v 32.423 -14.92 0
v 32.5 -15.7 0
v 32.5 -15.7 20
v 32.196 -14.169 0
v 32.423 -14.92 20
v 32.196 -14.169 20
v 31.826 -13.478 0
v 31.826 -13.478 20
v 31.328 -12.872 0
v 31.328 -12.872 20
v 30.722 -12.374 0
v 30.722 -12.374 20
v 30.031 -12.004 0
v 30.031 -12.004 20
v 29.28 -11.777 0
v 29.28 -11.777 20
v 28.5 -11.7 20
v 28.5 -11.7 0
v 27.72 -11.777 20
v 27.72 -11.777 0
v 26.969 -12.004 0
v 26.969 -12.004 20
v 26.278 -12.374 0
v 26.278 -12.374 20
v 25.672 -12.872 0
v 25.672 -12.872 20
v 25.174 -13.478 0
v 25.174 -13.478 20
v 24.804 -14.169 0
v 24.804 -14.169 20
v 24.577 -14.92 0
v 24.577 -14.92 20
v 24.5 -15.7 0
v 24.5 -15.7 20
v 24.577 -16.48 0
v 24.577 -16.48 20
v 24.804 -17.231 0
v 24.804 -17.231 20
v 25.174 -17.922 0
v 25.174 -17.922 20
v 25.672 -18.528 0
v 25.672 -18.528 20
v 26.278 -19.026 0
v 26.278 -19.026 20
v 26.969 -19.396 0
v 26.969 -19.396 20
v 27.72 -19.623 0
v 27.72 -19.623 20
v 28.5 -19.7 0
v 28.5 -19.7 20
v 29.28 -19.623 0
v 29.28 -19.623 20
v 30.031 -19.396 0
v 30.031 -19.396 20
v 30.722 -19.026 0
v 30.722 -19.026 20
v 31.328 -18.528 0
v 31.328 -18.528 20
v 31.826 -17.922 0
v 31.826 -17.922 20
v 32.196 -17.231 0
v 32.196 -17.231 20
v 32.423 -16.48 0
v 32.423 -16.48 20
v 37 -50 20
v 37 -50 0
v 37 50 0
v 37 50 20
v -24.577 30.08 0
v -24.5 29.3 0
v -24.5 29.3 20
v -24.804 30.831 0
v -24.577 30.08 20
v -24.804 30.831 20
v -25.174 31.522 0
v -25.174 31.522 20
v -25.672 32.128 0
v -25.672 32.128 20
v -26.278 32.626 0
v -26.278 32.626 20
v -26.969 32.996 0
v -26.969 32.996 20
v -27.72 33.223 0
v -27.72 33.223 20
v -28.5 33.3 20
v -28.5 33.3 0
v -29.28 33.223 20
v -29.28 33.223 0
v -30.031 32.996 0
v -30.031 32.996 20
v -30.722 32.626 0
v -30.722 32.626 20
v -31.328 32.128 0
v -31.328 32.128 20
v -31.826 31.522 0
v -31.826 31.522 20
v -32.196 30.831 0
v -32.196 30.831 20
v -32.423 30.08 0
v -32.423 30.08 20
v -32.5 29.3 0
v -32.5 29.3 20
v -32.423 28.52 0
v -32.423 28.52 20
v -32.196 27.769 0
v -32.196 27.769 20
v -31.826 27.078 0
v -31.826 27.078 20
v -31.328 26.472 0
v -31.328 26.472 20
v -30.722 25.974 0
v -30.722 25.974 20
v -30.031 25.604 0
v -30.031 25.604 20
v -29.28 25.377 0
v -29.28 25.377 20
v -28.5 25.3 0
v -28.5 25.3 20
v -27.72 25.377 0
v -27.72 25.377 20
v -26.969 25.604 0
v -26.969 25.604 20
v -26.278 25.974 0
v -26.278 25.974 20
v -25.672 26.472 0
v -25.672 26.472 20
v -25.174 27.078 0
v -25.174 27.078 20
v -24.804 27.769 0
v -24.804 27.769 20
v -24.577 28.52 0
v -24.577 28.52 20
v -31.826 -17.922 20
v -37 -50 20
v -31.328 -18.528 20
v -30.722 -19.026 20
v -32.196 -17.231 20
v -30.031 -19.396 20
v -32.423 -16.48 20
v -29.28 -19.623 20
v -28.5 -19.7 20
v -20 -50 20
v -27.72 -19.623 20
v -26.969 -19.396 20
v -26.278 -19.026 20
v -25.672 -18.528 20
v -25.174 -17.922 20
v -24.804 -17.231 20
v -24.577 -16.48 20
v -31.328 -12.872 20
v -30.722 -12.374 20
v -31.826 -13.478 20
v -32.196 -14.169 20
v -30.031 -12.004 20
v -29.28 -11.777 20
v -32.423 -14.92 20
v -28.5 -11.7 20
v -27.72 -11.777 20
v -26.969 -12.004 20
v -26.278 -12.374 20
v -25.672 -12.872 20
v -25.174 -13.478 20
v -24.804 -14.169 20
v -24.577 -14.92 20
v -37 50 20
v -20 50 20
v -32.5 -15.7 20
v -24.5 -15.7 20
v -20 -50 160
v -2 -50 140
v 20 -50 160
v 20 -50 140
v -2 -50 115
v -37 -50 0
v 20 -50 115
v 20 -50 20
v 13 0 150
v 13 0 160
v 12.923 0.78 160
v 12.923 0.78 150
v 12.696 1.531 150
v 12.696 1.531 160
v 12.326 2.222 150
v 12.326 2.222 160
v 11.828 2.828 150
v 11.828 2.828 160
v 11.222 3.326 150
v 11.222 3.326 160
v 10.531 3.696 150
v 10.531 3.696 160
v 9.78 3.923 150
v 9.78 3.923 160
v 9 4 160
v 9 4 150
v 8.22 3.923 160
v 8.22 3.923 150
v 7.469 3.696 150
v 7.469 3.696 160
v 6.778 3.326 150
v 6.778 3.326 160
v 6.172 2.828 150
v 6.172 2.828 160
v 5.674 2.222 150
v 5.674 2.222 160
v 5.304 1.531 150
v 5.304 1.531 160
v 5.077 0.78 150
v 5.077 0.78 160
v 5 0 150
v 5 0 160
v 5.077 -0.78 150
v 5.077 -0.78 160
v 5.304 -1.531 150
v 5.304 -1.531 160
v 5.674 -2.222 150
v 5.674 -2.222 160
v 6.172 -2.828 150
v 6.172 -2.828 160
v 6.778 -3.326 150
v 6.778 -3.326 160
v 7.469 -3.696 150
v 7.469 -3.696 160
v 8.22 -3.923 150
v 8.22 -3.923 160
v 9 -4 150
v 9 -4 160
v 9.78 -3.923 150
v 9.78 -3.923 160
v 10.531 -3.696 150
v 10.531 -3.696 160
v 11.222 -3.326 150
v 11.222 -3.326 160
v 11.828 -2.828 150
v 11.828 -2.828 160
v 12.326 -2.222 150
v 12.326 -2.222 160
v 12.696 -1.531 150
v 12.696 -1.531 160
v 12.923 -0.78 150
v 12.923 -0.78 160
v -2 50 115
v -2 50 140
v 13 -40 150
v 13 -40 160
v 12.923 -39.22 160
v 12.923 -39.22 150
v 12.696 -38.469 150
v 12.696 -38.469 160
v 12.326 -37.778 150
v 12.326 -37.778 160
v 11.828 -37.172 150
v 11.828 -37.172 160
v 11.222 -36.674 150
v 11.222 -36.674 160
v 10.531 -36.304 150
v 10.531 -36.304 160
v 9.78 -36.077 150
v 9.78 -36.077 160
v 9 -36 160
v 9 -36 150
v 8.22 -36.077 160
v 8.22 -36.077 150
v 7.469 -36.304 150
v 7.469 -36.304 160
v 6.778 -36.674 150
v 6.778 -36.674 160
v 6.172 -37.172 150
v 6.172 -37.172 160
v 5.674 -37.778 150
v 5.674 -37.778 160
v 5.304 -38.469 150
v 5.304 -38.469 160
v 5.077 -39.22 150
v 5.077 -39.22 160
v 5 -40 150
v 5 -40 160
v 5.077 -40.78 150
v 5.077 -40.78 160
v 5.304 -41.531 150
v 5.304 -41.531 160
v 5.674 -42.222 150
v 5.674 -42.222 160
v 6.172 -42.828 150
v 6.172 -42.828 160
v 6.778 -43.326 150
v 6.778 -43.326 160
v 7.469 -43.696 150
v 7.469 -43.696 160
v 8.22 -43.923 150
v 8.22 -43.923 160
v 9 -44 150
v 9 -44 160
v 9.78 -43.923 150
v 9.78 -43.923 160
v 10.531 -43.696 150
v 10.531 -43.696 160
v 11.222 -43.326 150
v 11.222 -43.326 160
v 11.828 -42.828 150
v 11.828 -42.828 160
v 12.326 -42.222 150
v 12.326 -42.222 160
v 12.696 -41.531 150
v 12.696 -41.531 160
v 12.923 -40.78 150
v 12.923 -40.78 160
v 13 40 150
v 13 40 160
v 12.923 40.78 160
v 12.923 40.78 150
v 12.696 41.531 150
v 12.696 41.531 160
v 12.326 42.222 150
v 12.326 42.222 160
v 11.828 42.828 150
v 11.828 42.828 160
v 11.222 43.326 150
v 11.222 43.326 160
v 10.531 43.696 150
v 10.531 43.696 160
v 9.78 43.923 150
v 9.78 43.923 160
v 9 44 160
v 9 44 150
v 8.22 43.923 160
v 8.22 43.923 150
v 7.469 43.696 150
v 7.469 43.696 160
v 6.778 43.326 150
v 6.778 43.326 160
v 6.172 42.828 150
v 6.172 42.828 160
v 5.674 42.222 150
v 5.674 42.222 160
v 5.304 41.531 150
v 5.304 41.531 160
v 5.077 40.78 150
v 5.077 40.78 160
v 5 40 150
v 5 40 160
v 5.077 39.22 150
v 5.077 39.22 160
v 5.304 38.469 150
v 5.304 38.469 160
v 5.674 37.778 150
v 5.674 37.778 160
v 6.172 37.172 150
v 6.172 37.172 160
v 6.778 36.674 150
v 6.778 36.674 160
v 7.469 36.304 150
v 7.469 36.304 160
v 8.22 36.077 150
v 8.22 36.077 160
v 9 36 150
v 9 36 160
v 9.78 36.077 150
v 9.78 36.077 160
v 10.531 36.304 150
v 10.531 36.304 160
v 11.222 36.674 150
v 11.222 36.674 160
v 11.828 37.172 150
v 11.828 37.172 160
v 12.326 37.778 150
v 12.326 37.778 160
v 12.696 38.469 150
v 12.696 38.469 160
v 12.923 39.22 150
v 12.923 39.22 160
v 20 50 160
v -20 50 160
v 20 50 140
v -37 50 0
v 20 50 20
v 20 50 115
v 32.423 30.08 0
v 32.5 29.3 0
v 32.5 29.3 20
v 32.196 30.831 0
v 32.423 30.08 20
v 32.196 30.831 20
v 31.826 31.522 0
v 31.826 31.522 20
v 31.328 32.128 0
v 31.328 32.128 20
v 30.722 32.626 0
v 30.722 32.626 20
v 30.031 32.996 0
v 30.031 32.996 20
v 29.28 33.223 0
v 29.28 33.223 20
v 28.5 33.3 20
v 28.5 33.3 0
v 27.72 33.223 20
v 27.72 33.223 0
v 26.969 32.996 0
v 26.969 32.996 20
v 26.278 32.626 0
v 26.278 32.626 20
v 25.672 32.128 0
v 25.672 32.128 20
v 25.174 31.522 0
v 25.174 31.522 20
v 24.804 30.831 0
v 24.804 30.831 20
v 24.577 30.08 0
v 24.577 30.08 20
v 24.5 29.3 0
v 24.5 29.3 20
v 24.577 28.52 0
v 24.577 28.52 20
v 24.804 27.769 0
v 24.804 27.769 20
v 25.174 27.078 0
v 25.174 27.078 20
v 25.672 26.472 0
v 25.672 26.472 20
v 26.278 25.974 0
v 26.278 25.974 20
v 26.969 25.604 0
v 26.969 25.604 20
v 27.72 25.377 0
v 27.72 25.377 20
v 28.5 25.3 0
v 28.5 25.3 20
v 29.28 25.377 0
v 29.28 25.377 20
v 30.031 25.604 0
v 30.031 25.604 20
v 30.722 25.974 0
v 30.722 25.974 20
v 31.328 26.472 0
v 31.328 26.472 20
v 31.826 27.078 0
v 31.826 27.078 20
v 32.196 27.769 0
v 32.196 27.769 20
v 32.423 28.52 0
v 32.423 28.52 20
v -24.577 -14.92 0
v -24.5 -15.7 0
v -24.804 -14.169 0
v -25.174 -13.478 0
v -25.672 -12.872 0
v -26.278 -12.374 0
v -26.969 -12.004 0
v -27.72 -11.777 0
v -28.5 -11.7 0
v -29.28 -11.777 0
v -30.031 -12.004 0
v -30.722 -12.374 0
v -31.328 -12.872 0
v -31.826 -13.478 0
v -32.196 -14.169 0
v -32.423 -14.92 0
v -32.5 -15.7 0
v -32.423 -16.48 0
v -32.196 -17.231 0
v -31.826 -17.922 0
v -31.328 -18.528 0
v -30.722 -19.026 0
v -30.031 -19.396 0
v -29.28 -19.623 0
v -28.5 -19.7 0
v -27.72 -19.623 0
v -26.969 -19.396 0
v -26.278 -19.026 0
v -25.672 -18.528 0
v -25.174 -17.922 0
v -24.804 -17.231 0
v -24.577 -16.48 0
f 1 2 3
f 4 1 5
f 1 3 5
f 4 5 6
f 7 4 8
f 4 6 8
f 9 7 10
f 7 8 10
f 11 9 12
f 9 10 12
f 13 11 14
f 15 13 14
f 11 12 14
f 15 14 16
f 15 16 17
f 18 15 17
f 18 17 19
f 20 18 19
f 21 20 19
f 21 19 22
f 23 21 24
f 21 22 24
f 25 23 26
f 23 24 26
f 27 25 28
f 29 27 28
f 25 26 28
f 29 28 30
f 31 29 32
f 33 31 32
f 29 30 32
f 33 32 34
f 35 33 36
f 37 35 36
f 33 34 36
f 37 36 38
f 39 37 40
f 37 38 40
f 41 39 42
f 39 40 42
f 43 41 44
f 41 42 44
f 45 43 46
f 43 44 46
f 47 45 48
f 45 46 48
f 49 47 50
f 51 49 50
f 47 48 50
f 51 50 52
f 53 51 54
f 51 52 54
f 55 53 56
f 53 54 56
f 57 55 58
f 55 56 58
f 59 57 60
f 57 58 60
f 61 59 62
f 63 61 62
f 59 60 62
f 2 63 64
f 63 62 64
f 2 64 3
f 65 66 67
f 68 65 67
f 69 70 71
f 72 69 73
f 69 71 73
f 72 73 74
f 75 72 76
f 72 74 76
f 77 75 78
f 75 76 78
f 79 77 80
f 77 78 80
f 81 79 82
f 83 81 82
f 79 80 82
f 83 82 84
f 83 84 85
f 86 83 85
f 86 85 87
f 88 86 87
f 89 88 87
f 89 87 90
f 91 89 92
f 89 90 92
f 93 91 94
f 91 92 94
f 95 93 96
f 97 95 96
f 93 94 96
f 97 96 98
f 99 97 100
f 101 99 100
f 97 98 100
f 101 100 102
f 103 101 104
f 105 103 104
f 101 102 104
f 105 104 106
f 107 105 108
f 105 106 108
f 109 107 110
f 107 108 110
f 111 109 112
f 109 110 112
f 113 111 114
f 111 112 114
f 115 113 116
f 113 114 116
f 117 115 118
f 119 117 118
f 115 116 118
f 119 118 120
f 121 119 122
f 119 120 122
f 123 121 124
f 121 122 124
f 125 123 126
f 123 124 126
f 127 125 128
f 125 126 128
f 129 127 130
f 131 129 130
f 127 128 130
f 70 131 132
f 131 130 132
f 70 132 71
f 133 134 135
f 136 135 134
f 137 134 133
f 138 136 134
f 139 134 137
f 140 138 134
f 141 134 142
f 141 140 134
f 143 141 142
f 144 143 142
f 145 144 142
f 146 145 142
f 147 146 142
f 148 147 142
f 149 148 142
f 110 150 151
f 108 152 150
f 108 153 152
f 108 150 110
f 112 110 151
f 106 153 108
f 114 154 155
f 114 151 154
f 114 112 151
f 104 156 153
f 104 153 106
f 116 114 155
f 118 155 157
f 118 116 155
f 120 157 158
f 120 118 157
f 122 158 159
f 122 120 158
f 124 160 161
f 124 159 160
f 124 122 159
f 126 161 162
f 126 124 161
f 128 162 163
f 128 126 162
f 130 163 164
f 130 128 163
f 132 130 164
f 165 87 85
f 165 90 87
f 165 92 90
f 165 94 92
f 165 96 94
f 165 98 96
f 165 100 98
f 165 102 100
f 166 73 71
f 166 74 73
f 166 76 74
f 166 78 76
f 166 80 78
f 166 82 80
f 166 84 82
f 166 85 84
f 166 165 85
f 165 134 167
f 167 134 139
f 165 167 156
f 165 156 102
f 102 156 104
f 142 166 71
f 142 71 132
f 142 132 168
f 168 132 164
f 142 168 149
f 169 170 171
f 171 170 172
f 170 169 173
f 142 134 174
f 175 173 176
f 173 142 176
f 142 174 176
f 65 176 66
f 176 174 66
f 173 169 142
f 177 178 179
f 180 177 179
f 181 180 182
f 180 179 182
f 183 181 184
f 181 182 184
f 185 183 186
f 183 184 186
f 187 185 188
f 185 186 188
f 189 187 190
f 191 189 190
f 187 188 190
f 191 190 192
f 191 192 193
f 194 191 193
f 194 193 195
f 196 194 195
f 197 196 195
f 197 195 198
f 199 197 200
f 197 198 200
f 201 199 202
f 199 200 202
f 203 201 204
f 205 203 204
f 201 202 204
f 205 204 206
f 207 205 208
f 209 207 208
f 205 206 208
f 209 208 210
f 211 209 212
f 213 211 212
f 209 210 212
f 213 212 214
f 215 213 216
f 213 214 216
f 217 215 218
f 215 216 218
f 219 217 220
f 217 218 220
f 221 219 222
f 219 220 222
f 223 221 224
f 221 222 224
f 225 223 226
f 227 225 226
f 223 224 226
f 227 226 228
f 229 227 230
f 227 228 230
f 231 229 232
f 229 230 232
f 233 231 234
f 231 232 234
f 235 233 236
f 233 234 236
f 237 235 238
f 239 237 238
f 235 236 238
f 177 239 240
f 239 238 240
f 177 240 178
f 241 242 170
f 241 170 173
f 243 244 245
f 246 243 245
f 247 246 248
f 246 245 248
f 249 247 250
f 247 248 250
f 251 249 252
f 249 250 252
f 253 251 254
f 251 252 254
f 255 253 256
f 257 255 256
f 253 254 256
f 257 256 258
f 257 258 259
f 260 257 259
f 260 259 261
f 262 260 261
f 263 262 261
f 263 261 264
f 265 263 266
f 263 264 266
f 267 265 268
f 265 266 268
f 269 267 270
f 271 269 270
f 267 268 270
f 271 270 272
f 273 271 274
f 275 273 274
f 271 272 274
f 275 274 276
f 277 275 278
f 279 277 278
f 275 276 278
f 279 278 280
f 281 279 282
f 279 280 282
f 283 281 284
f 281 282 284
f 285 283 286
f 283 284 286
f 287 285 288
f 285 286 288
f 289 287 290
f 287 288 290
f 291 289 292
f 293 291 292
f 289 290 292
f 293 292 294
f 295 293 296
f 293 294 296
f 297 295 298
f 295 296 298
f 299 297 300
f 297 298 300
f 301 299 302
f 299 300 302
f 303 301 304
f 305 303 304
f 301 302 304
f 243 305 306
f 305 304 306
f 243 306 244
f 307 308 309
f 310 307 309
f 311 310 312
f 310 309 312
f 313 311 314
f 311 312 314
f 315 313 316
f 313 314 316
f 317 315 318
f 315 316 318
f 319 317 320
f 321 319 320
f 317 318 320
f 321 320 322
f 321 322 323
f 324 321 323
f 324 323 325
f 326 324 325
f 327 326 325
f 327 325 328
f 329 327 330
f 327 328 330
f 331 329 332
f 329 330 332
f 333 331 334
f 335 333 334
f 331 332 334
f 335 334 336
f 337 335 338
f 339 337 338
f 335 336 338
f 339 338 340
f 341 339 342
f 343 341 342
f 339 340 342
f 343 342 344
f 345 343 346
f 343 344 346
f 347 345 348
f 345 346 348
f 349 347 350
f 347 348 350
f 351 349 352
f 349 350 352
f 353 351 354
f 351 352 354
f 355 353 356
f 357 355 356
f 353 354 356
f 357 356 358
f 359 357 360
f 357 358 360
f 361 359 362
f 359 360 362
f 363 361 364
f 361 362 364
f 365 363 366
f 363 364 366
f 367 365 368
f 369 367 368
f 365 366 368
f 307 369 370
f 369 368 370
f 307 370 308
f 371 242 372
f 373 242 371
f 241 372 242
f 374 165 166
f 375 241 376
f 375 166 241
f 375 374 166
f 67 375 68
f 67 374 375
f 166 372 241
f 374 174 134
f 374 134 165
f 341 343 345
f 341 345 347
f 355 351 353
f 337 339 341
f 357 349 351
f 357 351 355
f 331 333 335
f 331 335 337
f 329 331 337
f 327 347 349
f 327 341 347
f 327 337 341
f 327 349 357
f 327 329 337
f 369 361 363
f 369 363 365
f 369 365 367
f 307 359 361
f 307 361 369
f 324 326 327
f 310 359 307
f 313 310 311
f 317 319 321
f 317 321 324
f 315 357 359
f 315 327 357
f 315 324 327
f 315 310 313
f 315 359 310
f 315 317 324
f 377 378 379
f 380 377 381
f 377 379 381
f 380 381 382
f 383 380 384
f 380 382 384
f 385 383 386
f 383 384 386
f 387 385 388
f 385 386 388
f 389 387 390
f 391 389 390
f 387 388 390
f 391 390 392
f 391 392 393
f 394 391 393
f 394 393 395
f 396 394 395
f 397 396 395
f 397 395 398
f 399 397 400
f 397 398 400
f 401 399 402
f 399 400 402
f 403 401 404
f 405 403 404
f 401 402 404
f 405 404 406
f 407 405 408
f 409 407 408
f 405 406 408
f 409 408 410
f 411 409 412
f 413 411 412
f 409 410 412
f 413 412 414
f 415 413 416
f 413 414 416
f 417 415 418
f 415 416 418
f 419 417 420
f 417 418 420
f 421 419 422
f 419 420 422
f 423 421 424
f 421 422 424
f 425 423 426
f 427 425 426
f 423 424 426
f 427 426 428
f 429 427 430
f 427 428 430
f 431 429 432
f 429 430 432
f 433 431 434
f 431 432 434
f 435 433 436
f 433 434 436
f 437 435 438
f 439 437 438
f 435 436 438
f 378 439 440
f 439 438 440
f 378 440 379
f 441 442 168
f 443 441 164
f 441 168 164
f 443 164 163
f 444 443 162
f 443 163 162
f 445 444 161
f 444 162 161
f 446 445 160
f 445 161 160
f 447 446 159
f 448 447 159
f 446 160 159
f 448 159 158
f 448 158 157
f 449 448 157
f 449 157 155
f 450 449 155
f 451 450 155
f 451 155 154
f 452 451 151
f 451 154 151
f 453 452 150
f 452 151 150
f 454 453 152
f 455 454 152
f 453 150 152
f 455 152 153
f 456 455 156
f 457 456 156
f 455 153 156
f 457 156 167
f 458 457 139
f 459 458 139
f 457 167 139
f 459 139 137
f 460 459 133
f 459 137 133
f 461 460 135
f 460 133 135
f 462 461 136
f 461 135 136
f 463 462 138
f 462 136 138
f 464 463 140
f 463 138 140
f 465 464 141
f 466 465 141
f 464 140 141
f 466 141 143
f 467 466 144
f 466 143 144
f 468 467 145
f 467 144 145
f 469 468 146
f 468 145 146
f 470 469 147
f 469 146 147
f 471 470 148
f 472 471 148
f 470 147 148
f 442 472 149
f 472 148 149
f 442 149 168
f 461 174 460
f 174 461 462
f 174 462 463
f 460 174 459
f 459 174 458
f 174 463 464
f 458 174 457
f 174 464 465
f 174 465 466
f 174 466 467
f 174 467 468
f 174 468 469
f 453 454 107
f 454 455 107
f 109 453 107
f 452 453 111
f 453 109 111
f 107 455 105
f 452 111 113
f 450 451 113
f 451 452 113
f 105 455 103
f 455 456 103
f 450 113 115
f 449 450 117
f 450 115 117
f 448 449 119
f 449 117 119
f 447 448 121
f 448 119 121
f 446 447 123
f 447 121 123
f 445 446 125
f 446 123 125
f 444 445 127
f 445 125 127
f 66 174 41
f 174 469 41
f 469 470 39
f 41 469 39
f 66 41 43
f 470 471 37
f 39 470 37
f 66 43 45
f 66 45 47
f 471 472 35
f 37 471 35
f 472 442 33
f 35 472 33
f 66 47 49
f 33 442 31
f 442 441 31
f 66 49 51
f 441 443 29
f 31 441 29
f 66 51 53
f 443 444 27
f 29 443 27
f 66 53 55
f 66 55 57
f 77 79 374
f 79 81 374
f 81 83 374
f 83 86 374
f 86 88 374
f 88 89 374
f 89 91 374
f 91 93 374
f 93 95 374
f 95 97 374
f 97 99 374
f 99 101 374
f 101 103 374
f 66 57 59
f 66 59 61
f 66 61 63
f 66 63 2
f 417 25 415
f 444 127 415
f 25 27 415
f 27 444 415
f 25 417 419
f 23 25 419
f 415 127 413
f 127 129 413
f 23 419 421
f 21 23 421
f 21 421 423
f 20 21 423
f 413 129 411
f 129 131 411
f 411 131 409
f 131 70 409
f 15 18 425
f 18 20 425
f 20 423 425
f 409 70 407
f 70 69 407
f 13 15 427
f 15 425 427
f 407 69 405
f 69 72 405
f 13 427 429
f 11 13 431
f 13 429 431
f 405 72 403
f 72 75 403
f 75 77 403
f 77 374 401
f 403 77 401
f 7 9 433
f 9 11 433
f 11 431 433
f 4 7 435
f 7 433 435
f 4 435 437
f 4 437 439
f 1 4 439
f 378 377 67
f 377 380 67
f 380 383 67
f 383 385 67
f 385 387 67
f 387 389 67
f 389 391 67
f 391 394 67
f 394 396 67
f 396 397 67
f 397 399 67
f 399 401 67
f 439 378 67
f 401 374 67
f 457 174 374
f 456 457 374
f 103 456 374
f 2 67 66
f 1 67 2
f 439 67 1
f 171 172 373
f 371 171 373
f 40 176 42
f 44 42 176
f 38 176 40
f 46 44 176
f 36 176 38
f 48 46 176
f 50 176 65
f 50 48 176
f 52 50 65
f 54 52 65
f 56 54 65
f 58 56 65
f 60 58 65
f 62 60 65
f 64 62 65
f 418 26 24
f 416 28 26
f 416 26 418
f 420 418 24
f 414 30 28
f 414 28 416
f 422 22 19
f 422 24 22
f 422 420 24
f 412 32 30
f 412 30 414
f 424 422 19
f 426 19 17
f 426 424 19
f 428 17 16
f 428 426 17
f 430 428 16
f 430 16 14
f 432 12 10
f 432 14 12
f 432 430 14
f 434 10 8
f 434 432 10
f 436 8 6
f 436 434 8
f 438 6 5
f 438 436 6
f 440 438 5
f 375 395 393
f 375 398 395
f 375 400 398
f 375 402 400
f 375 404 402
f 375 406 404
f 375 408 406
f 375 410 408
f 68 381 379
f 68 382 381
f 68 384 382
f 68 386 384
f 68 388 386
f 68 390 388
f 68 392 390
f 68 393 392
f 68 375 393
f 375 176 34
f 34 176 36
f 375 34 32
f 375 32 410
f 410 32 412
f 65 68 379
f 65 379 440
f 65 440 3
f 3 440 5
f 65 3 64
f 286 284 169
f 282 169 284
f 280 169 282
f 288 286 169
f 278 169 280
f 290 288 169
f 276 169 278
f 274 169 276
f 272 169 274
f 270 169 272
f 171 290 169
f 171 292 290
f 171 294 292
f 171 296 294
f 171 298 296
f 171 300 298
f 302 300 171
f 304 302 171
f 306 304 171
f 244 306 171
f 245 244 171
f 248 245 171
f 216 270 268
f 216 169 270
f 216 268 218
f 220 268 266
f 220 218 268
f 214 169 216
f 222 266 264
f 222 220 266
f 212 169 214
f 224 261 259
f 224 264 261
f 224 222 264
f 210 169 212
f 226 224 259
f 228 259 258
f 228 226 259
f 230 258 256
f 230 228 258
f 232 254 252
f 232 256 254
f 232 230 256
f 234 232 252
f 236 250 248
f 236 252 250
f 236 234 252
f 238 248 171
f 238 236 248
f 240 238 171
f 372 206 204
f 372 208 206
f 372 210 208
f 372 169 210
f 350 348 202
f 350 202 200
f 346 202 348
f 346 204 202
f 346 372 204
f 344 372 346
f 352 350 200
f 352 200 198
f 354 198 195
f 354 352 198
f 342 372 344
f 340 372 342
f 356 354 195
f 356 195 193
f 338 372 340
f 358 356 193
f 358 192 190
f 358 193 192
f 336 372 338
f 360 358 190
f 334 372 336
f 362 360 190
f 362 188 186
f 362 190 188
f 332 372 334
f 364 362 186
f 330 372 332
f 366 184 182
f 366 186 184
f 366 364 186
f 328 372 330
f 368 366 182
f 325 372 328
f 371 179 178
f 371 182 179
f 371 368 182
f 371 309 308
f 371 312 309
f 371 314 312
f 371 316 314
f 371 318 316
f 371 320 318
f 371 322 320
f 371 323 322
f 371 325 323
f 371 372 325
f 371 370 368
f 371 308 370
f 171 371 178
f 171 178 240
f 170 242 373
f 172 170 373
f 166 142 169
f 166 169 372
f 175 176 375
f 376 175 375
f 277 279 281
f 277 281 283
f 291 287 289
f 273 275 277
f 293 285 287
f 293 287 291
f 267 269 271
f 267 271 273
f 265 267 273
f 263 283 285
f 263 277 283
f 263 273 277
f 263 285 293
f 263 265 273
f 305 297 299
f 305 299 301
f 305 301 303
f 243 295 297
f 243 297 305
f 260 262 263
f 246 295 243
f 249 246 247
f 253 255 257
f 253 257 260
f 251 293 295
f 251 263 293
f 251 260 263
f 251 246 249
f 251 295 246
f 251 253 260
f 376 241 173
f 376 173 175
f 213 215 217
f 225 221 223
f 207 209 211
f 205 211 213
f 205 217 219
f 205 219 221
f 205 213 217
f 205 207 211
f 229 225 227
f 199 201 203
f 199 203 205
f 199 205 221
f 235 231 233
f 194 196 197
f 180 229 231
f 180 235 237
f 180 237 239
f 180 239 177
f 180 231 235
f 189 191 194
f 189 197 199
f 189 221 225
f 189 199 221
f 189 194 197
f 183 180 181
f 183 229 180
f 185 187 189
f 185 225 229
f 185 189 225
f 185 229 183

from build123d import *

# Parameters (mm, degrees)
SZKIC1_W                    = 74
SZKIC1_H                    = 100
DODANIE_WYCI_GNI_CIE1_DEPTH = 20
SZKIC3_W                    = 40
SZKIC3_H                    = 100
DODANIE_WYCI_GNI_CIE2_DEPTH = 140
SZKIC4_R                    = 4
WYTNIJ_WYCI_GNI_CIE1_DEPTH  = 20
SZYK_LINIOWY1_COUNT         = 2
SZYK_LINIOWY1_PITCH         = 45
SZYK_LINIOWY1_COUNT_DIR2    = 2
SZYK_LINIOWY1_PITCH_DIR2    = 57
SZKIC5_W                    = 22
SZKIC5_H                    = 25
WYTNIJ_WYCI_GNI_CIE2_DEPTH  = 100
SZKIC6_R                    = 4
WYTNIJ_WYCI_GNI_CIE3_DEPTH  = 10


with BuildPart() as part:
    # Szkic1 → Dodanie-wyciągnięcie1 (new body)
    with BuildSketch(Plane.XY):
        Rectangle(SZKIC1_W, SZKIC1_H)
    extrude(amount=DODANIE_WYCI_GNI_CIE1_DEPTH)

    # Szkic3 → Dodanie-wyciągnięcie2 (add)
    with BuildSketch(Plane.XY.offset(20)):
        Rectangle(SZKIC3_W, SZKIC3_H)
    extrude(amount=DODANIE_WYCI_GNI_CIE2_DEPTH)

    # Szkic4 → Wytnij-wyciągnięcie1 (cut)
    with BuildSketch(Plane.XY.offset(20)):
        with Locations((-28.5, 29.3)):
            Circle(SZKIC4_R)
    wytnij_wyci_gni_cie1 = extrude(amount=-WYTNIJ_WYCI_GNI_CIE1_DEPTH, mode=Mode.SUBTRACT)

    # Szyk liniowy1: Wytnij-wyci_gni_cie1 2 × 2
    with Locations(*[(j * SZYK_LINIOWY1_PITCH_DIR2, -i * SZYK_LINIOWY1_PITCH, 0) for i in range(SZYK_LINIOWY1_COUNT) for j in range(SZYK_LINIOWY1_COUNT_DIR2) if (i, j) != (0, 0)]):
        add(wytnij_wyci_gni_cie1, mode=Mode.SUBTRACT)

    # Szkic5 → Wytnij-wyciągnięcie2 (cut)
    with BuildSketch(Plane(origin=(0, 50, 0), x_dir=(1, 0, 0), z_dir=(0, 1, 0))):
        with Locations((9, -127.5)):
            Rectangle(SZKIC5_W, SZKIC5_H)
    extrude(amount=-WYTNIJ_WYCI_GNI_CIE2_DEPTH, mode=Mode.SUBTRACT)

    # Szkic6 → Wytnij-wyciągnięcie3 (cut)
    with BuildSketch(Plane.XY.offset(160)):
        with Locations((9, 40)):
            Circle(SZKIC6_R)
        with Locations((9, 0)):
            Circle(SZKIC6_R)
        with Locations((9, -40)):
            Circle(SZKIC6_R)
    extrude(amount=-WYTNIJ_WYCI_GNI_CIE3_DEPTH, mode=Mode.SUBTRACT)


solid = part.part
